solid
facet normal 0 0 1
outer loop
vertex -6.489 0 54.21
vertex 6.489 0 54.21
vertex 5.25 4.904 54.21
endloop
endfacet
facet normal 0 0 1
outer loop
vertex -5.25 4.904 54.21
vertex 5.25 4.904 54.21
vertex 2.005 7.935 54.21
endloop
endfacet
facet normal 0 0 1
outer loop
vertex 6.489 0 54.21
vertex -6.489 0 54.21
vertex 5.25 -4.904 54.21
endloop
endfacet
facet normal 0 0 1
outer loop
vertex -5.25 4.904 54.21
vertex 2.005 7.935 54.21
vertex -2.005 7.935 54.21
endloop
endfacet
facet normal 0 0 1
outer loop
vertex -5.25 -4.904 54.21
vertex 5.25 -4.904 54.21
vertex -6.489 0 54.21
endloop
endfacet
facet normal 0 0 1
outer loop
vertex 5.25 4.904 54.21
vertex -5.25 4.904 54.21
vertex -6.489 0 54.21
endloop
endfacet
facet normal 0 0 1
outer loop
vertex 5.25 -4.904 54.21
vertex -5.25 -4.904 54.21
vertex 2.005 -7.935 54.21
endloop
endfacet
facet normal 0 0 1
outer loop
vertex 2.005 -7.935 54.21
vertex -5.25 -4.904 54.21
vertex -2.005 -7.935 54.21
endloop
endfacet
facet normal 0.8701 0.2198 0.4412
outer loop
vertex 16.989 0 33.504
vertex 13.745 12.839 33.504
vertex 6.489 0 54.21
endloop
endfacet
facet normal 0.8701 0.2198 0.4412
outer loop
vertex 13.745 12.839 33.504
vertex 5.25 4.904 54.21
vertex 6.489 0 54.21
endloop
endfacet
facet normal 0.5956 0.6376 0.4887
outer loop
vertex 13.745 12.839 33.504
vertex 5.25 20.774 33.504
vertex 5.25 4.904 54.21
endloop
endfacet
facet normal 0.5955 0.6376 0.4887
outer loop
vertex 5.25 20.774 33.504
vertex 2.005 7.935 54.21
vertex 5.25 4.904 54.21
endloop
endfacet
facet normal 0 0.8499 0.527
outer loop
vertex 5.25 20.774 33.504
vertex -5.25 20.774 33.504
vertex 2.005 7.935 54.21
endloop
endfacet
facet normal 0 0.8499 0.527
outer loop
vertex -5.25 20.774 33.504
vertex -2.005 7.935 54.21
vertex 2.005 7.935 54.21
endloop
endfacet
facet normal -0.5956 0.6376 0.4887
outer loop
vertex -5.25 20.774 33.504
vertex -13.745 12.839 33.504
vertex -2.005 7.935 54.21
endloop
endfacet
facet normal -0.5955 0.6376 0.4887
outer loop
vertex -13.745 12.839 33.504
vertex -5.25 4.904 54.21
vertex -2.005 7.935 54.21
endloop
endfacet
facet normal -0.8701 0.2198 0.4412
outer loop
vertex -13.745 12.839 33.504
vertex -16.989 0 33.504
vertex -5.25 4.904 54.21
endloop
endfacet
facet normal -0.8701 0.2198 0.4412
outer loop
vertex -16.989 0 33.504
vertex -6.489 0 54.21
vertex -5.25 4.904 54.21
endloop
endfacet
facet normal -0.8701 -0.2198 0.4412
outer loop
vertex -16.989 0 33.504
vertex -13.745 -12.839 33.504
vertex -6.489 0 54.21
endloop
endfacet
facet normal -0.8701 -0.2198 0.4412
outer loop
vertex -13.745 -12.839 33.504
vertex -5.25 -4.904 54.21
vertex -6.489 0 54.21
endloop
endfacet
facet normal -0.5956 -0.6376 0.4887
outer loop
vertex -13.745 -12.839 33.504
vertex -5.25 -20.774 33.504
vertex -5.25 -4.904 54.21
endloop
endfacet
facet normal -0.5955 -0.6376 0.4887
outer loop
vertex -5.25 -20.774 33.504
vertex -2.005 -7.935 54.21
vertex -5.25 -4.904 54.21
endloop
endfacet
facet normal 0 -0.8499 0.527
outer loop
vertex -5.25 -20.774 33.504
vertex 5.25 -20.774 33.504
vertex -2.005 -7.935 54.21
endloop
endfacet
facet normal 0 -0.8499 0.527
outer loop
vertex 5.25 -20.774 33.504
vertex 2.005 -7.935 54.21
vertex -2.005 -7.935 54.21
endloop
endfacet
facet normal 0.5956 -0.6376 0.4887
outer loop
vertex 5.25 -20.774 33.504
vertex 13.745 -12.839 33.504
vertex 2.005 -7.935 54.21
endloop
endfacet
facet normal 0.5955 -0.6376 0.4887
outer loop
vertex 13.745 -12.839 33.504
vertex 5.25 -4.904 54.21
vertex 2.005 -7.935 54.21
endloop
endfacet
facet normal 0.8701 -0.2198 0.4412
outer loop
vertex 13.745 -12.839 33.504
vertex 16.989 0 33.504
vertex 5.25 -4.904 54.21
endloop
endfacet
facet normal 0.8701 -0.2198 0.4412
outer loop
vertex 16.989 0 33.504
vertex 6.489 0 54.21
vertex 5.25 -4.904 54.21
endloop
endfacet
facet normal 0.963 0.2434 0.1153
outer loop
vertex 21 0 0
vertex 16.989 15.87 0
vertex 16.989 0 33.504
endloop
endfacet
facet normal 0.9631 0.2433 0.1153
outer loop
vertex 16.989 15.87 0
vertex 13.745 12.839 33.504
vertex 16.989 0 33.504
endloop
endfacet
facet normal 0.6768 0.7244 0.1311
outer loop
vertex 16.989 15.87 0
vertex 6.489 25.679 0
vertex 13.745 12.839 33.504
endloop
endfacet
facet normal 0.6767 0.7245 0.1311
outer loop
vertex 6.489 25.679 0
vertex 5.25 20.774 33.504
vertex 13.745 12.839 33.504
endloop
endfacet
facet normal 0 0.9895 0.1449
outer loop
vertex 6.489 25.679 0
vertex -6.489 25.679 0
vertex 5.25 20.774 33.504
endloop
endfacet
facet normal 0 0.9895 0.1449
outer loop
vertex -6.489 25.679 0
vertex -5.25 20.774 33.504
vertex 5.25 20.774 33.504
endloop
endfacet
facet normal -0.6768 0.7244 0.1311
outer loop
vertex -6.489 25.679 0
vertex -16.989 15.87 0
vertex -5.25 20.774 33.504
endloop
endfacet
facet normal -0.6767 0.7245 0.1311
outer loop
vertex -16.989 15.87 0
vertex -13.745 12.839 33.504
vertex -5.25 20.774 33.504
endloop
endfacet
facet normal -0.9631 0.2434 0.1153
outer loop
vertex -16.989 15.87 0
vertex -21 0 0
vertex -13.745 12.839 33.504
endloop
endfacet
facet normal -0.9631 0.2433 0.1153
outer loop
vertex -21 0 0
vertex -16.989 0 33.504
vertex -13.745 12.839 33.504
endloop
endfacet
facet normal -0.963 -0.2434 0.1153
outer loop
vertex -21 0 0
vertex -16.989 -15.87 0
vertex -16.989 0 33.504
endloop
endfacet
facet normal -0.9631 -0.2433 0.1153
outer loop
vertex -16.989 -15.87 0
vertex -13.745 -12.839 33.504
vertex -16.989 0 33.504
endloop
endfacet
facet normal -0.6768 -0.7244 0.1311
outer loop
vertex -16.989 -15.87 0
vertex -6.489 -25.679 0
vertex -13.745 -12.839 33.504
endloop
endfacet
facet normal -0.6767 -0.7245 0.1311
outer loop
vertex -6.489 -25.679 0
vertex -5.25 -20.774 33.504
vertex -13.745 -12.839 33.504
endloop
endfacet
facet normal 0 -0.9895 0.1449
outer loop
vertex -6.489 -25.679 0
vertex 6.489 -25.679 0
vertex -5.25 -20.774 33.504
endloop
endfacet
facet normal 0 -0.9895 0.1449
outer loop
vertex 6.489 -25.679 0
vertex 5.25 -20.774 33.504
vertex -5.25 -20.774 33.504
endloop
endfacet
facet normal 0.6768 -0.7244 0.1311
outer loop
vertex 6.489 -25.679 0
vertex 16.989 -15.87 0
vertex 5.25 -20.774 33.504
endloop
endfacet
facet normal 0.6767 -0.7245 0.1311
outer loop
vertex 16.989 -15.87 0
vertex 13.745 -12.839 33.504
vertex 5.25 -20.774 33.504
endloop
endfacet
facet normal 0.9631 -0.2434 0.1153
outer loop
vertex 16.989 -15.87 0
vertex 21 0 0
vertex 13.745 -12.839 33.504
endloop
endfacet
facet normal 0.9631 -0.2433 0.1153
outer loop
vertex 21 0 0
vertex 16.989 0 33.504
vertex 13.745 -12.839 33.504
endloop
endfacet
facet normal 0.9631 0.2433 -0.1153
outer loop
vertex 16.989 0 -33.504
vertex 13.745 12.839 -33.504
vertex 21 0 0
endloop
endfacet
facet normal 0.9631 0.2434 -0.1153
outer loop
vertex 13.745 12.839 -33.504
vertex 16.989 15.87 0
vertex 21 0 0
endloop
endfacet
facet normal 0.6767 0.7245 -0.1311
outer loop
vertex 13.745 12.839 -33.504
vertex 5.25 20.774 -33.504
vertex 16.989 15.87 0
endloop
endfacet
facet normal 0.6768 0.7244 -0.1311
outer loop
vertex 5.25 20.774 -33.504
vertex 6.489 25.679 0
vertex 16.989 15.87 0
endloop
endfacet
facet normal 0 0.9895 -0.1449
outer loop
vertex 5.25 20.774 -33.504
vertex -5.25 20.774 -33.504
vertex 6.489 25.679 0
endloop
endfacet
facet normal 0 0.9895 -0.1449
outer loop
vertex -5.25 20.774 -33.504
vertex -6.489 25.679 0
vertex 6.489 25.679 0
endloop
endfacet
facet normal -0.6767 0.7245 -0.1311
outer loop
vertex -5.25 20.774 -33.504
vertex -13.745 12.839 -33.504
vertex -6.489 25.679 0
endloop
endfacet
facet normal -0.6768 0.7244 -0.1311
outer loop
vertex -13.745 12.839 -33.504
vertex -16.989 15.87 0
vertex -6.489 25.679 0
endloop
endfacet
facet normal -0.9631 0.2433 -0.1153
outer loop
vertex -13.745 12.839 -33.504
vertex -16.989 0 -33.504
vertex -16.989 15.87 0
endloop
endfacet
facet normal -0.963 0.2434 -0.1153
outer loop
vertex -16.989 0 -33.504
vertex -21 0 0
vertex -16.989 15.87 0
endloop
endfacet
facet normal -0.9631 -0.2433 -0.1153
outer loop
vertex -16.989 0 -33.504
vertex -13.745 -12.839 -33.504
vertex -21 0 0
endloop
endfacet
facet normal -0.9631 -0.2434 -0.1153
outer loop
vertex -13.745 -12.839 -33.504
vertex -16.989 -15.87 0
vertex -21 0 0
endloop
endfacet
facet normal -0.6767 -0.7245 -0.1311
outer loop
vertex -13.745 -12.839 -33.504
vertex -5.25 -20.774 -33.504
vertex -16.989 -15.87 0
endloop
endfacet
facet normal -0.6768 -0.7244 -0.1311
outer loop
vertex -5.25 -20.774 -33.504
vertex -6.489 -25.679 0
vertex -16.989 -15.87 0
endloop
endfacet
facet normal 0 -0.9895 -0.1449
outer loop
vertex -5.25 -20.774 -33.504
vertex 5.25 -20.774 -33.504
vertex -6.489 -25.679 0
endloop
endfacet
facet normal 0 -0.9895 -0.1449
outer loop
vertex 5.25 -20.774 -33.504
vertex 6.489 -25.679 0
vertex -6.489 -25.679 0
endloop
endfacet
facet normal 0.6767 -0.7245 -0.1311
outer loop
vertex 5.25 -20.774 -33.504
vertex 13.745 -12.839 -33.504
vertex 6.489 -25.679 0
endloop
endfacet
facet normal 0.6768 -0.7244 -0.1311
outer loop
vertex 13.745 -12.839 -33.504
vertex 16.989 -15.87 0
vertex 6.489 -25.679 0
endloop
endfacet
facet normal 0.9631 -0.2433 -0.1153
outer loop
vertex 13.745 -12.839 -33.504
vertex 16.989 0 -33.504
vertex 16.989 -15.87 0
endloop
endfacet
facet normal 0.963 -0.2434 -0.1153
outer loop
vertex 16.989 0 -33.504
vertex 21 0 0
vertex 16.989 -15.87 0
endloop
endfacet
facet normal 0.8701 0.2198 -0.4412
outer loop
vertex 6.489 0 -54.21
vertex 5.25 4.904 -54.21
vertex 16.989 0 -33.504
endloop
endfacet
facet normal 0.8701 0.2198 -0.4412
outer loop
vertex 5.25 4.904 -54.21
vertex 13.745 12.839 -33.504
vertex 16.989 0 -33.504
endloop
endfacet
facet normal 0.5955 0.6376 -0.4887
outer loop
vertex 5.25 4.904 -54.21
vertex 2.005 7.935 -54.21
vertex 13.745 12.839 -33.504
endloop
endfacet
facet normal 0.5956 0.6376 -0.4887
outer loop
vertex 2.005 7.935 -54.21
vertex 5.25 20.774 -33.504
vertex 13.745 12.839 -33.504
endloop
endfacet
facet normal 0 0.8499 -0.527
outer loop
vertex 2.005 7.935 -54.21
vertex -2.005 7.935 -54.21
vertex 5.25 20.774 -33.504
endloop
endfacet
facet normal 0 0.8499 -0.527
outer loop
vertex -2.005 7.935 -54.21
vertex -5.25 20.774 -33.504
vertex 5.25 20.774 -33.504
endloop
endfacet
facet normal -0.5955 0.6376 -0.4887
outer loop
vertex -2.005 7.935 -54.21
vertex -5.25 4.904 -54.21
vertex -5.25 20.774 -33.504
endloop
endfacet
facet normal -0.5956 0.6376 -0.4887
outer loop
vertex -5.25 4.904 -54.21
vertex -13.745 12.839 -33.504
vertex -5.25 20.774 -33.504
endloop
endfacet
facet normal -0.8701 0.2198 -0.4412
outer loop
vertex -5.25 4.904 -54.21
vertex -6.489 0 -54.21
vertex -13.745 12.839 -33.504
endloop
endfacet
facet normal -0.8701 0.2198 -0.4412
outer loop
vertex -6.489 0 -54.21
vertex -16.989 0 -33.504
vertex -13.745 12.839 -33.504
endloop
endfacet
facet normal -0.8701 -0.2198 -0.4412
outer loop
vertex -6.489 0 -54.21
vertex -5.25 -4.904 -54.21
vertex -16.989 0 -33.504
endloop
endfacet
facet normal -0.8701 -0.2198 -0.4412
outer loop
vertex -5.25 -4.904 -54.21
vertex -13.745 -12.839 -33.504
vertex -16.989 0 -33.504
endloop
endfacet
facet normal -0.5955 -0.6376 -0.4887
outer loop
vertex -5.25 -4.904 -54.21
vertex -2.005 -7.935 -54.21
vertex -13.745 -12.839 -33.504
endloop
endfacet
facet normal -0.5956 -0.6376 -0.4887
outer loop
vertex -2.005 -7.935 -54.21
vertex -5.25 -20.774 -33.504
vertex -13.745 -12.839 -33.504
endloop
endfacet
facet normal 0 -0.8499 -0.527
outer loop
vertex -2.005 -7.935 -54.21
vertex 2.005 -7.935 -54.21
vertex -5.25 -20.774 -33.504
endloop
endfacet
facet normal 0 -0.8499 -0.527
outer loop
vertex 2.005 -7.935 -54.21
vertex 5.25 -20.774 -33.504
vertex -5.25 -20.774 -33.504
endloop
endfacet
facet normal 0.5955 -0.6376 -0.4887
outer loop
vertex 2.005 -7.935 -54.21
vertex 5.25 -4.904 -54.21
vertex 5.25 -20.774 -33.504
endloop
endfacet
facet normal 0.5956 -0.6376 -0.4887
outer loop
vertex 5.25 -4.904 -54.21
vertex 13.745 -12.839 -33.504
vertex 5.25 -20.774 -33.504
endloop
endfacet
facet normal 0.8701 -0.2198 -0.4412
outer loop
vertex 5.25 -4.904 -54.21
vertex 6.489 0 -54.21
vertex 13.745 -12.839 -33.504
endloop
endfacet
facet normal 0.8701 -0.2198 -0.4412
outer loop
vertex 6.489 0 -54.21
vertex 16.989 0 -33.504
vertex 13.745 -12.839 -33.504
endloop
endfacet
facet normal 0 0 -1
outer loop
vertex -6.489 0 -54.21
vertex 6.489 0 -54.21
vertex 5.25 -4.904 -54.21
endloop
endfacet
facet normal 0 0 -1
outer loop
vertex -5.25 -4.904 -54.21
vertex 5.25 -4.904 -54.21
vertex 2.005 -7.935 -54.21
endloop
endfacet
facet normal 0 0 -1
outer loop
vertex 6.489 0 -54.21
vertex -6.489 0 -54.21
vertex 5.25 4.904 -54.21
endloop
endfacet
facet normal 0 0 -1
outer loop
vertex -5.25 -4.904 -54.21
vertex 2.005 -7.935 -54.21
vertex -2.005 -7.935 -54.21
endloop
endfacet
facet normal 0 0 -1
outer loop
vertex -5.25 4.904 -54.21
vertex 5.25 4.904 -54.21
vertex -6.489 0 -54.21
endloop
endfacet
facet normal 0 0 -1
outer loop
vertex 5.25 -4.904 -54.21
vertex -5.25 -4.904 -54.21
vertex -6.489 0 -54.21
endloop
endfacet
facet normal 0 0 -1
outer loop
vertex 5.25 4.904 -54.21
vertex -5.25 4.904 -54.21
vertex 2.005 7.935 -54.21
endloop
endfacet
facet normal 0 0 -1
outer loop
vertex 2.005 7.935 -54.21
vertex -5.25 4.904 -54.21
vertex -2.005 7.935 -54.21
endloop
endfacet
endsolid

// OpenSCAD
// Generated by SolidPython 1.0.1 on 2020-07-29 00:46:47


scale(v = [7, 9, 19]) {
	sphere(r = 3);
}
/***********************************************
*********      SolidPython code:      **********
************************************************
 
# import packages: SolidPython
from solid import *
from solid.utils import *
from itertools import chain, combinations, permutations


class Resize:

    def __init__(self, scad_file):
        self.scad_file = scad_file
        #self.scad_file = import_scad(scad_file)
        # cone/cylinder param:
        self.r1 = 0
        self.r2 = 0
        self.h = 0
        # rectangular prism param:
        self.w = 0
        self.l = 0
        # ellipse param:
        self.r = 0

    # import OpenScad code (file name corresponds to shape)


    # classify shape + parameters
    def assign(self, param1, param2, param3):
        if self.scad_file == 'cone.scad':
            self.r1 = param1
            self.r2 = param2
            self.h = param3
        elif self.scad_file == 'cylinder.scad':
            self.r1 = param1
            self.r2 = param2
            self.h = param3
        elif self.scad_file == 'rectangularPrism.scad':
            self.h = param1
            self.l = param2
            self.w = param3
        else:
            self.r = param1
            self.h = param2

    # resize parameters
    def iterate(self):
        x = range(3, 20, 2)
        i = 1
        if self.scad_file == 'cone.scad':
            tempList = list(permutations(x, 2))
            for temp in tempList:
                param1 = temp[0]
                param2 = temp[1]
                filepath = 'produced_scad_files/' + 'cone' + str(param1) + '_' + str(param2) + '_' + '.scad'
                scad_render_to_file(cylinder(h=param1, r1=param2, r2=0), filepath)

        elif self.scad_file == 'cylinder.scad':
            tempList = list(permutations(x, 3))
            for temp in tempList:
                param1 = temp[0]
                param2 = temp[1]
                filepath = 'produced_scad_files/' + 'cylinder' + str(param1) + '_' + str(param2) + '_' + '.scad'
                scad_render_to_file(cylinder(h=param1, r1=param2, r2=param2), filepath)

        elif self.scad_file == 'rectangularPrism.scad':
            tempList = list(permutations(x, 3))
            for temp in tempList:
                param1 = temp[0]
                param2 = temp[1]
                param3 = temp[2]
                filepath = 'produced_scad_files/' + 'rectangularPrism' + str(param1) + '_' + str(param2) + '_' + str(
                    param3) + '.scad'
                scad_render_to_file(cube(size=(param1, param2, param3)), filepath)

        elif self.scad_file == 'ellipse.scad':
            tempList = list(permutations(x, 4))
            for temp in tempList:
                param1 = temp[0]
                param2 = temp[1]
                param3 = temp[2]
                param4 = temp[3]
                filepath = 'produced_scad_files/' + 'ellipse' + str(param1) + '_' + str(param2) + '_' + str(param3) + '_' + str(param4) + '.scad'
                scad_render_to_file(scale([param1, param2, param3])(sphere(r=param4)), filepath)

    def render_to_scadfile(self):
        scad_render_to_file(scad, 'example.scad') 
 
************************************************/
